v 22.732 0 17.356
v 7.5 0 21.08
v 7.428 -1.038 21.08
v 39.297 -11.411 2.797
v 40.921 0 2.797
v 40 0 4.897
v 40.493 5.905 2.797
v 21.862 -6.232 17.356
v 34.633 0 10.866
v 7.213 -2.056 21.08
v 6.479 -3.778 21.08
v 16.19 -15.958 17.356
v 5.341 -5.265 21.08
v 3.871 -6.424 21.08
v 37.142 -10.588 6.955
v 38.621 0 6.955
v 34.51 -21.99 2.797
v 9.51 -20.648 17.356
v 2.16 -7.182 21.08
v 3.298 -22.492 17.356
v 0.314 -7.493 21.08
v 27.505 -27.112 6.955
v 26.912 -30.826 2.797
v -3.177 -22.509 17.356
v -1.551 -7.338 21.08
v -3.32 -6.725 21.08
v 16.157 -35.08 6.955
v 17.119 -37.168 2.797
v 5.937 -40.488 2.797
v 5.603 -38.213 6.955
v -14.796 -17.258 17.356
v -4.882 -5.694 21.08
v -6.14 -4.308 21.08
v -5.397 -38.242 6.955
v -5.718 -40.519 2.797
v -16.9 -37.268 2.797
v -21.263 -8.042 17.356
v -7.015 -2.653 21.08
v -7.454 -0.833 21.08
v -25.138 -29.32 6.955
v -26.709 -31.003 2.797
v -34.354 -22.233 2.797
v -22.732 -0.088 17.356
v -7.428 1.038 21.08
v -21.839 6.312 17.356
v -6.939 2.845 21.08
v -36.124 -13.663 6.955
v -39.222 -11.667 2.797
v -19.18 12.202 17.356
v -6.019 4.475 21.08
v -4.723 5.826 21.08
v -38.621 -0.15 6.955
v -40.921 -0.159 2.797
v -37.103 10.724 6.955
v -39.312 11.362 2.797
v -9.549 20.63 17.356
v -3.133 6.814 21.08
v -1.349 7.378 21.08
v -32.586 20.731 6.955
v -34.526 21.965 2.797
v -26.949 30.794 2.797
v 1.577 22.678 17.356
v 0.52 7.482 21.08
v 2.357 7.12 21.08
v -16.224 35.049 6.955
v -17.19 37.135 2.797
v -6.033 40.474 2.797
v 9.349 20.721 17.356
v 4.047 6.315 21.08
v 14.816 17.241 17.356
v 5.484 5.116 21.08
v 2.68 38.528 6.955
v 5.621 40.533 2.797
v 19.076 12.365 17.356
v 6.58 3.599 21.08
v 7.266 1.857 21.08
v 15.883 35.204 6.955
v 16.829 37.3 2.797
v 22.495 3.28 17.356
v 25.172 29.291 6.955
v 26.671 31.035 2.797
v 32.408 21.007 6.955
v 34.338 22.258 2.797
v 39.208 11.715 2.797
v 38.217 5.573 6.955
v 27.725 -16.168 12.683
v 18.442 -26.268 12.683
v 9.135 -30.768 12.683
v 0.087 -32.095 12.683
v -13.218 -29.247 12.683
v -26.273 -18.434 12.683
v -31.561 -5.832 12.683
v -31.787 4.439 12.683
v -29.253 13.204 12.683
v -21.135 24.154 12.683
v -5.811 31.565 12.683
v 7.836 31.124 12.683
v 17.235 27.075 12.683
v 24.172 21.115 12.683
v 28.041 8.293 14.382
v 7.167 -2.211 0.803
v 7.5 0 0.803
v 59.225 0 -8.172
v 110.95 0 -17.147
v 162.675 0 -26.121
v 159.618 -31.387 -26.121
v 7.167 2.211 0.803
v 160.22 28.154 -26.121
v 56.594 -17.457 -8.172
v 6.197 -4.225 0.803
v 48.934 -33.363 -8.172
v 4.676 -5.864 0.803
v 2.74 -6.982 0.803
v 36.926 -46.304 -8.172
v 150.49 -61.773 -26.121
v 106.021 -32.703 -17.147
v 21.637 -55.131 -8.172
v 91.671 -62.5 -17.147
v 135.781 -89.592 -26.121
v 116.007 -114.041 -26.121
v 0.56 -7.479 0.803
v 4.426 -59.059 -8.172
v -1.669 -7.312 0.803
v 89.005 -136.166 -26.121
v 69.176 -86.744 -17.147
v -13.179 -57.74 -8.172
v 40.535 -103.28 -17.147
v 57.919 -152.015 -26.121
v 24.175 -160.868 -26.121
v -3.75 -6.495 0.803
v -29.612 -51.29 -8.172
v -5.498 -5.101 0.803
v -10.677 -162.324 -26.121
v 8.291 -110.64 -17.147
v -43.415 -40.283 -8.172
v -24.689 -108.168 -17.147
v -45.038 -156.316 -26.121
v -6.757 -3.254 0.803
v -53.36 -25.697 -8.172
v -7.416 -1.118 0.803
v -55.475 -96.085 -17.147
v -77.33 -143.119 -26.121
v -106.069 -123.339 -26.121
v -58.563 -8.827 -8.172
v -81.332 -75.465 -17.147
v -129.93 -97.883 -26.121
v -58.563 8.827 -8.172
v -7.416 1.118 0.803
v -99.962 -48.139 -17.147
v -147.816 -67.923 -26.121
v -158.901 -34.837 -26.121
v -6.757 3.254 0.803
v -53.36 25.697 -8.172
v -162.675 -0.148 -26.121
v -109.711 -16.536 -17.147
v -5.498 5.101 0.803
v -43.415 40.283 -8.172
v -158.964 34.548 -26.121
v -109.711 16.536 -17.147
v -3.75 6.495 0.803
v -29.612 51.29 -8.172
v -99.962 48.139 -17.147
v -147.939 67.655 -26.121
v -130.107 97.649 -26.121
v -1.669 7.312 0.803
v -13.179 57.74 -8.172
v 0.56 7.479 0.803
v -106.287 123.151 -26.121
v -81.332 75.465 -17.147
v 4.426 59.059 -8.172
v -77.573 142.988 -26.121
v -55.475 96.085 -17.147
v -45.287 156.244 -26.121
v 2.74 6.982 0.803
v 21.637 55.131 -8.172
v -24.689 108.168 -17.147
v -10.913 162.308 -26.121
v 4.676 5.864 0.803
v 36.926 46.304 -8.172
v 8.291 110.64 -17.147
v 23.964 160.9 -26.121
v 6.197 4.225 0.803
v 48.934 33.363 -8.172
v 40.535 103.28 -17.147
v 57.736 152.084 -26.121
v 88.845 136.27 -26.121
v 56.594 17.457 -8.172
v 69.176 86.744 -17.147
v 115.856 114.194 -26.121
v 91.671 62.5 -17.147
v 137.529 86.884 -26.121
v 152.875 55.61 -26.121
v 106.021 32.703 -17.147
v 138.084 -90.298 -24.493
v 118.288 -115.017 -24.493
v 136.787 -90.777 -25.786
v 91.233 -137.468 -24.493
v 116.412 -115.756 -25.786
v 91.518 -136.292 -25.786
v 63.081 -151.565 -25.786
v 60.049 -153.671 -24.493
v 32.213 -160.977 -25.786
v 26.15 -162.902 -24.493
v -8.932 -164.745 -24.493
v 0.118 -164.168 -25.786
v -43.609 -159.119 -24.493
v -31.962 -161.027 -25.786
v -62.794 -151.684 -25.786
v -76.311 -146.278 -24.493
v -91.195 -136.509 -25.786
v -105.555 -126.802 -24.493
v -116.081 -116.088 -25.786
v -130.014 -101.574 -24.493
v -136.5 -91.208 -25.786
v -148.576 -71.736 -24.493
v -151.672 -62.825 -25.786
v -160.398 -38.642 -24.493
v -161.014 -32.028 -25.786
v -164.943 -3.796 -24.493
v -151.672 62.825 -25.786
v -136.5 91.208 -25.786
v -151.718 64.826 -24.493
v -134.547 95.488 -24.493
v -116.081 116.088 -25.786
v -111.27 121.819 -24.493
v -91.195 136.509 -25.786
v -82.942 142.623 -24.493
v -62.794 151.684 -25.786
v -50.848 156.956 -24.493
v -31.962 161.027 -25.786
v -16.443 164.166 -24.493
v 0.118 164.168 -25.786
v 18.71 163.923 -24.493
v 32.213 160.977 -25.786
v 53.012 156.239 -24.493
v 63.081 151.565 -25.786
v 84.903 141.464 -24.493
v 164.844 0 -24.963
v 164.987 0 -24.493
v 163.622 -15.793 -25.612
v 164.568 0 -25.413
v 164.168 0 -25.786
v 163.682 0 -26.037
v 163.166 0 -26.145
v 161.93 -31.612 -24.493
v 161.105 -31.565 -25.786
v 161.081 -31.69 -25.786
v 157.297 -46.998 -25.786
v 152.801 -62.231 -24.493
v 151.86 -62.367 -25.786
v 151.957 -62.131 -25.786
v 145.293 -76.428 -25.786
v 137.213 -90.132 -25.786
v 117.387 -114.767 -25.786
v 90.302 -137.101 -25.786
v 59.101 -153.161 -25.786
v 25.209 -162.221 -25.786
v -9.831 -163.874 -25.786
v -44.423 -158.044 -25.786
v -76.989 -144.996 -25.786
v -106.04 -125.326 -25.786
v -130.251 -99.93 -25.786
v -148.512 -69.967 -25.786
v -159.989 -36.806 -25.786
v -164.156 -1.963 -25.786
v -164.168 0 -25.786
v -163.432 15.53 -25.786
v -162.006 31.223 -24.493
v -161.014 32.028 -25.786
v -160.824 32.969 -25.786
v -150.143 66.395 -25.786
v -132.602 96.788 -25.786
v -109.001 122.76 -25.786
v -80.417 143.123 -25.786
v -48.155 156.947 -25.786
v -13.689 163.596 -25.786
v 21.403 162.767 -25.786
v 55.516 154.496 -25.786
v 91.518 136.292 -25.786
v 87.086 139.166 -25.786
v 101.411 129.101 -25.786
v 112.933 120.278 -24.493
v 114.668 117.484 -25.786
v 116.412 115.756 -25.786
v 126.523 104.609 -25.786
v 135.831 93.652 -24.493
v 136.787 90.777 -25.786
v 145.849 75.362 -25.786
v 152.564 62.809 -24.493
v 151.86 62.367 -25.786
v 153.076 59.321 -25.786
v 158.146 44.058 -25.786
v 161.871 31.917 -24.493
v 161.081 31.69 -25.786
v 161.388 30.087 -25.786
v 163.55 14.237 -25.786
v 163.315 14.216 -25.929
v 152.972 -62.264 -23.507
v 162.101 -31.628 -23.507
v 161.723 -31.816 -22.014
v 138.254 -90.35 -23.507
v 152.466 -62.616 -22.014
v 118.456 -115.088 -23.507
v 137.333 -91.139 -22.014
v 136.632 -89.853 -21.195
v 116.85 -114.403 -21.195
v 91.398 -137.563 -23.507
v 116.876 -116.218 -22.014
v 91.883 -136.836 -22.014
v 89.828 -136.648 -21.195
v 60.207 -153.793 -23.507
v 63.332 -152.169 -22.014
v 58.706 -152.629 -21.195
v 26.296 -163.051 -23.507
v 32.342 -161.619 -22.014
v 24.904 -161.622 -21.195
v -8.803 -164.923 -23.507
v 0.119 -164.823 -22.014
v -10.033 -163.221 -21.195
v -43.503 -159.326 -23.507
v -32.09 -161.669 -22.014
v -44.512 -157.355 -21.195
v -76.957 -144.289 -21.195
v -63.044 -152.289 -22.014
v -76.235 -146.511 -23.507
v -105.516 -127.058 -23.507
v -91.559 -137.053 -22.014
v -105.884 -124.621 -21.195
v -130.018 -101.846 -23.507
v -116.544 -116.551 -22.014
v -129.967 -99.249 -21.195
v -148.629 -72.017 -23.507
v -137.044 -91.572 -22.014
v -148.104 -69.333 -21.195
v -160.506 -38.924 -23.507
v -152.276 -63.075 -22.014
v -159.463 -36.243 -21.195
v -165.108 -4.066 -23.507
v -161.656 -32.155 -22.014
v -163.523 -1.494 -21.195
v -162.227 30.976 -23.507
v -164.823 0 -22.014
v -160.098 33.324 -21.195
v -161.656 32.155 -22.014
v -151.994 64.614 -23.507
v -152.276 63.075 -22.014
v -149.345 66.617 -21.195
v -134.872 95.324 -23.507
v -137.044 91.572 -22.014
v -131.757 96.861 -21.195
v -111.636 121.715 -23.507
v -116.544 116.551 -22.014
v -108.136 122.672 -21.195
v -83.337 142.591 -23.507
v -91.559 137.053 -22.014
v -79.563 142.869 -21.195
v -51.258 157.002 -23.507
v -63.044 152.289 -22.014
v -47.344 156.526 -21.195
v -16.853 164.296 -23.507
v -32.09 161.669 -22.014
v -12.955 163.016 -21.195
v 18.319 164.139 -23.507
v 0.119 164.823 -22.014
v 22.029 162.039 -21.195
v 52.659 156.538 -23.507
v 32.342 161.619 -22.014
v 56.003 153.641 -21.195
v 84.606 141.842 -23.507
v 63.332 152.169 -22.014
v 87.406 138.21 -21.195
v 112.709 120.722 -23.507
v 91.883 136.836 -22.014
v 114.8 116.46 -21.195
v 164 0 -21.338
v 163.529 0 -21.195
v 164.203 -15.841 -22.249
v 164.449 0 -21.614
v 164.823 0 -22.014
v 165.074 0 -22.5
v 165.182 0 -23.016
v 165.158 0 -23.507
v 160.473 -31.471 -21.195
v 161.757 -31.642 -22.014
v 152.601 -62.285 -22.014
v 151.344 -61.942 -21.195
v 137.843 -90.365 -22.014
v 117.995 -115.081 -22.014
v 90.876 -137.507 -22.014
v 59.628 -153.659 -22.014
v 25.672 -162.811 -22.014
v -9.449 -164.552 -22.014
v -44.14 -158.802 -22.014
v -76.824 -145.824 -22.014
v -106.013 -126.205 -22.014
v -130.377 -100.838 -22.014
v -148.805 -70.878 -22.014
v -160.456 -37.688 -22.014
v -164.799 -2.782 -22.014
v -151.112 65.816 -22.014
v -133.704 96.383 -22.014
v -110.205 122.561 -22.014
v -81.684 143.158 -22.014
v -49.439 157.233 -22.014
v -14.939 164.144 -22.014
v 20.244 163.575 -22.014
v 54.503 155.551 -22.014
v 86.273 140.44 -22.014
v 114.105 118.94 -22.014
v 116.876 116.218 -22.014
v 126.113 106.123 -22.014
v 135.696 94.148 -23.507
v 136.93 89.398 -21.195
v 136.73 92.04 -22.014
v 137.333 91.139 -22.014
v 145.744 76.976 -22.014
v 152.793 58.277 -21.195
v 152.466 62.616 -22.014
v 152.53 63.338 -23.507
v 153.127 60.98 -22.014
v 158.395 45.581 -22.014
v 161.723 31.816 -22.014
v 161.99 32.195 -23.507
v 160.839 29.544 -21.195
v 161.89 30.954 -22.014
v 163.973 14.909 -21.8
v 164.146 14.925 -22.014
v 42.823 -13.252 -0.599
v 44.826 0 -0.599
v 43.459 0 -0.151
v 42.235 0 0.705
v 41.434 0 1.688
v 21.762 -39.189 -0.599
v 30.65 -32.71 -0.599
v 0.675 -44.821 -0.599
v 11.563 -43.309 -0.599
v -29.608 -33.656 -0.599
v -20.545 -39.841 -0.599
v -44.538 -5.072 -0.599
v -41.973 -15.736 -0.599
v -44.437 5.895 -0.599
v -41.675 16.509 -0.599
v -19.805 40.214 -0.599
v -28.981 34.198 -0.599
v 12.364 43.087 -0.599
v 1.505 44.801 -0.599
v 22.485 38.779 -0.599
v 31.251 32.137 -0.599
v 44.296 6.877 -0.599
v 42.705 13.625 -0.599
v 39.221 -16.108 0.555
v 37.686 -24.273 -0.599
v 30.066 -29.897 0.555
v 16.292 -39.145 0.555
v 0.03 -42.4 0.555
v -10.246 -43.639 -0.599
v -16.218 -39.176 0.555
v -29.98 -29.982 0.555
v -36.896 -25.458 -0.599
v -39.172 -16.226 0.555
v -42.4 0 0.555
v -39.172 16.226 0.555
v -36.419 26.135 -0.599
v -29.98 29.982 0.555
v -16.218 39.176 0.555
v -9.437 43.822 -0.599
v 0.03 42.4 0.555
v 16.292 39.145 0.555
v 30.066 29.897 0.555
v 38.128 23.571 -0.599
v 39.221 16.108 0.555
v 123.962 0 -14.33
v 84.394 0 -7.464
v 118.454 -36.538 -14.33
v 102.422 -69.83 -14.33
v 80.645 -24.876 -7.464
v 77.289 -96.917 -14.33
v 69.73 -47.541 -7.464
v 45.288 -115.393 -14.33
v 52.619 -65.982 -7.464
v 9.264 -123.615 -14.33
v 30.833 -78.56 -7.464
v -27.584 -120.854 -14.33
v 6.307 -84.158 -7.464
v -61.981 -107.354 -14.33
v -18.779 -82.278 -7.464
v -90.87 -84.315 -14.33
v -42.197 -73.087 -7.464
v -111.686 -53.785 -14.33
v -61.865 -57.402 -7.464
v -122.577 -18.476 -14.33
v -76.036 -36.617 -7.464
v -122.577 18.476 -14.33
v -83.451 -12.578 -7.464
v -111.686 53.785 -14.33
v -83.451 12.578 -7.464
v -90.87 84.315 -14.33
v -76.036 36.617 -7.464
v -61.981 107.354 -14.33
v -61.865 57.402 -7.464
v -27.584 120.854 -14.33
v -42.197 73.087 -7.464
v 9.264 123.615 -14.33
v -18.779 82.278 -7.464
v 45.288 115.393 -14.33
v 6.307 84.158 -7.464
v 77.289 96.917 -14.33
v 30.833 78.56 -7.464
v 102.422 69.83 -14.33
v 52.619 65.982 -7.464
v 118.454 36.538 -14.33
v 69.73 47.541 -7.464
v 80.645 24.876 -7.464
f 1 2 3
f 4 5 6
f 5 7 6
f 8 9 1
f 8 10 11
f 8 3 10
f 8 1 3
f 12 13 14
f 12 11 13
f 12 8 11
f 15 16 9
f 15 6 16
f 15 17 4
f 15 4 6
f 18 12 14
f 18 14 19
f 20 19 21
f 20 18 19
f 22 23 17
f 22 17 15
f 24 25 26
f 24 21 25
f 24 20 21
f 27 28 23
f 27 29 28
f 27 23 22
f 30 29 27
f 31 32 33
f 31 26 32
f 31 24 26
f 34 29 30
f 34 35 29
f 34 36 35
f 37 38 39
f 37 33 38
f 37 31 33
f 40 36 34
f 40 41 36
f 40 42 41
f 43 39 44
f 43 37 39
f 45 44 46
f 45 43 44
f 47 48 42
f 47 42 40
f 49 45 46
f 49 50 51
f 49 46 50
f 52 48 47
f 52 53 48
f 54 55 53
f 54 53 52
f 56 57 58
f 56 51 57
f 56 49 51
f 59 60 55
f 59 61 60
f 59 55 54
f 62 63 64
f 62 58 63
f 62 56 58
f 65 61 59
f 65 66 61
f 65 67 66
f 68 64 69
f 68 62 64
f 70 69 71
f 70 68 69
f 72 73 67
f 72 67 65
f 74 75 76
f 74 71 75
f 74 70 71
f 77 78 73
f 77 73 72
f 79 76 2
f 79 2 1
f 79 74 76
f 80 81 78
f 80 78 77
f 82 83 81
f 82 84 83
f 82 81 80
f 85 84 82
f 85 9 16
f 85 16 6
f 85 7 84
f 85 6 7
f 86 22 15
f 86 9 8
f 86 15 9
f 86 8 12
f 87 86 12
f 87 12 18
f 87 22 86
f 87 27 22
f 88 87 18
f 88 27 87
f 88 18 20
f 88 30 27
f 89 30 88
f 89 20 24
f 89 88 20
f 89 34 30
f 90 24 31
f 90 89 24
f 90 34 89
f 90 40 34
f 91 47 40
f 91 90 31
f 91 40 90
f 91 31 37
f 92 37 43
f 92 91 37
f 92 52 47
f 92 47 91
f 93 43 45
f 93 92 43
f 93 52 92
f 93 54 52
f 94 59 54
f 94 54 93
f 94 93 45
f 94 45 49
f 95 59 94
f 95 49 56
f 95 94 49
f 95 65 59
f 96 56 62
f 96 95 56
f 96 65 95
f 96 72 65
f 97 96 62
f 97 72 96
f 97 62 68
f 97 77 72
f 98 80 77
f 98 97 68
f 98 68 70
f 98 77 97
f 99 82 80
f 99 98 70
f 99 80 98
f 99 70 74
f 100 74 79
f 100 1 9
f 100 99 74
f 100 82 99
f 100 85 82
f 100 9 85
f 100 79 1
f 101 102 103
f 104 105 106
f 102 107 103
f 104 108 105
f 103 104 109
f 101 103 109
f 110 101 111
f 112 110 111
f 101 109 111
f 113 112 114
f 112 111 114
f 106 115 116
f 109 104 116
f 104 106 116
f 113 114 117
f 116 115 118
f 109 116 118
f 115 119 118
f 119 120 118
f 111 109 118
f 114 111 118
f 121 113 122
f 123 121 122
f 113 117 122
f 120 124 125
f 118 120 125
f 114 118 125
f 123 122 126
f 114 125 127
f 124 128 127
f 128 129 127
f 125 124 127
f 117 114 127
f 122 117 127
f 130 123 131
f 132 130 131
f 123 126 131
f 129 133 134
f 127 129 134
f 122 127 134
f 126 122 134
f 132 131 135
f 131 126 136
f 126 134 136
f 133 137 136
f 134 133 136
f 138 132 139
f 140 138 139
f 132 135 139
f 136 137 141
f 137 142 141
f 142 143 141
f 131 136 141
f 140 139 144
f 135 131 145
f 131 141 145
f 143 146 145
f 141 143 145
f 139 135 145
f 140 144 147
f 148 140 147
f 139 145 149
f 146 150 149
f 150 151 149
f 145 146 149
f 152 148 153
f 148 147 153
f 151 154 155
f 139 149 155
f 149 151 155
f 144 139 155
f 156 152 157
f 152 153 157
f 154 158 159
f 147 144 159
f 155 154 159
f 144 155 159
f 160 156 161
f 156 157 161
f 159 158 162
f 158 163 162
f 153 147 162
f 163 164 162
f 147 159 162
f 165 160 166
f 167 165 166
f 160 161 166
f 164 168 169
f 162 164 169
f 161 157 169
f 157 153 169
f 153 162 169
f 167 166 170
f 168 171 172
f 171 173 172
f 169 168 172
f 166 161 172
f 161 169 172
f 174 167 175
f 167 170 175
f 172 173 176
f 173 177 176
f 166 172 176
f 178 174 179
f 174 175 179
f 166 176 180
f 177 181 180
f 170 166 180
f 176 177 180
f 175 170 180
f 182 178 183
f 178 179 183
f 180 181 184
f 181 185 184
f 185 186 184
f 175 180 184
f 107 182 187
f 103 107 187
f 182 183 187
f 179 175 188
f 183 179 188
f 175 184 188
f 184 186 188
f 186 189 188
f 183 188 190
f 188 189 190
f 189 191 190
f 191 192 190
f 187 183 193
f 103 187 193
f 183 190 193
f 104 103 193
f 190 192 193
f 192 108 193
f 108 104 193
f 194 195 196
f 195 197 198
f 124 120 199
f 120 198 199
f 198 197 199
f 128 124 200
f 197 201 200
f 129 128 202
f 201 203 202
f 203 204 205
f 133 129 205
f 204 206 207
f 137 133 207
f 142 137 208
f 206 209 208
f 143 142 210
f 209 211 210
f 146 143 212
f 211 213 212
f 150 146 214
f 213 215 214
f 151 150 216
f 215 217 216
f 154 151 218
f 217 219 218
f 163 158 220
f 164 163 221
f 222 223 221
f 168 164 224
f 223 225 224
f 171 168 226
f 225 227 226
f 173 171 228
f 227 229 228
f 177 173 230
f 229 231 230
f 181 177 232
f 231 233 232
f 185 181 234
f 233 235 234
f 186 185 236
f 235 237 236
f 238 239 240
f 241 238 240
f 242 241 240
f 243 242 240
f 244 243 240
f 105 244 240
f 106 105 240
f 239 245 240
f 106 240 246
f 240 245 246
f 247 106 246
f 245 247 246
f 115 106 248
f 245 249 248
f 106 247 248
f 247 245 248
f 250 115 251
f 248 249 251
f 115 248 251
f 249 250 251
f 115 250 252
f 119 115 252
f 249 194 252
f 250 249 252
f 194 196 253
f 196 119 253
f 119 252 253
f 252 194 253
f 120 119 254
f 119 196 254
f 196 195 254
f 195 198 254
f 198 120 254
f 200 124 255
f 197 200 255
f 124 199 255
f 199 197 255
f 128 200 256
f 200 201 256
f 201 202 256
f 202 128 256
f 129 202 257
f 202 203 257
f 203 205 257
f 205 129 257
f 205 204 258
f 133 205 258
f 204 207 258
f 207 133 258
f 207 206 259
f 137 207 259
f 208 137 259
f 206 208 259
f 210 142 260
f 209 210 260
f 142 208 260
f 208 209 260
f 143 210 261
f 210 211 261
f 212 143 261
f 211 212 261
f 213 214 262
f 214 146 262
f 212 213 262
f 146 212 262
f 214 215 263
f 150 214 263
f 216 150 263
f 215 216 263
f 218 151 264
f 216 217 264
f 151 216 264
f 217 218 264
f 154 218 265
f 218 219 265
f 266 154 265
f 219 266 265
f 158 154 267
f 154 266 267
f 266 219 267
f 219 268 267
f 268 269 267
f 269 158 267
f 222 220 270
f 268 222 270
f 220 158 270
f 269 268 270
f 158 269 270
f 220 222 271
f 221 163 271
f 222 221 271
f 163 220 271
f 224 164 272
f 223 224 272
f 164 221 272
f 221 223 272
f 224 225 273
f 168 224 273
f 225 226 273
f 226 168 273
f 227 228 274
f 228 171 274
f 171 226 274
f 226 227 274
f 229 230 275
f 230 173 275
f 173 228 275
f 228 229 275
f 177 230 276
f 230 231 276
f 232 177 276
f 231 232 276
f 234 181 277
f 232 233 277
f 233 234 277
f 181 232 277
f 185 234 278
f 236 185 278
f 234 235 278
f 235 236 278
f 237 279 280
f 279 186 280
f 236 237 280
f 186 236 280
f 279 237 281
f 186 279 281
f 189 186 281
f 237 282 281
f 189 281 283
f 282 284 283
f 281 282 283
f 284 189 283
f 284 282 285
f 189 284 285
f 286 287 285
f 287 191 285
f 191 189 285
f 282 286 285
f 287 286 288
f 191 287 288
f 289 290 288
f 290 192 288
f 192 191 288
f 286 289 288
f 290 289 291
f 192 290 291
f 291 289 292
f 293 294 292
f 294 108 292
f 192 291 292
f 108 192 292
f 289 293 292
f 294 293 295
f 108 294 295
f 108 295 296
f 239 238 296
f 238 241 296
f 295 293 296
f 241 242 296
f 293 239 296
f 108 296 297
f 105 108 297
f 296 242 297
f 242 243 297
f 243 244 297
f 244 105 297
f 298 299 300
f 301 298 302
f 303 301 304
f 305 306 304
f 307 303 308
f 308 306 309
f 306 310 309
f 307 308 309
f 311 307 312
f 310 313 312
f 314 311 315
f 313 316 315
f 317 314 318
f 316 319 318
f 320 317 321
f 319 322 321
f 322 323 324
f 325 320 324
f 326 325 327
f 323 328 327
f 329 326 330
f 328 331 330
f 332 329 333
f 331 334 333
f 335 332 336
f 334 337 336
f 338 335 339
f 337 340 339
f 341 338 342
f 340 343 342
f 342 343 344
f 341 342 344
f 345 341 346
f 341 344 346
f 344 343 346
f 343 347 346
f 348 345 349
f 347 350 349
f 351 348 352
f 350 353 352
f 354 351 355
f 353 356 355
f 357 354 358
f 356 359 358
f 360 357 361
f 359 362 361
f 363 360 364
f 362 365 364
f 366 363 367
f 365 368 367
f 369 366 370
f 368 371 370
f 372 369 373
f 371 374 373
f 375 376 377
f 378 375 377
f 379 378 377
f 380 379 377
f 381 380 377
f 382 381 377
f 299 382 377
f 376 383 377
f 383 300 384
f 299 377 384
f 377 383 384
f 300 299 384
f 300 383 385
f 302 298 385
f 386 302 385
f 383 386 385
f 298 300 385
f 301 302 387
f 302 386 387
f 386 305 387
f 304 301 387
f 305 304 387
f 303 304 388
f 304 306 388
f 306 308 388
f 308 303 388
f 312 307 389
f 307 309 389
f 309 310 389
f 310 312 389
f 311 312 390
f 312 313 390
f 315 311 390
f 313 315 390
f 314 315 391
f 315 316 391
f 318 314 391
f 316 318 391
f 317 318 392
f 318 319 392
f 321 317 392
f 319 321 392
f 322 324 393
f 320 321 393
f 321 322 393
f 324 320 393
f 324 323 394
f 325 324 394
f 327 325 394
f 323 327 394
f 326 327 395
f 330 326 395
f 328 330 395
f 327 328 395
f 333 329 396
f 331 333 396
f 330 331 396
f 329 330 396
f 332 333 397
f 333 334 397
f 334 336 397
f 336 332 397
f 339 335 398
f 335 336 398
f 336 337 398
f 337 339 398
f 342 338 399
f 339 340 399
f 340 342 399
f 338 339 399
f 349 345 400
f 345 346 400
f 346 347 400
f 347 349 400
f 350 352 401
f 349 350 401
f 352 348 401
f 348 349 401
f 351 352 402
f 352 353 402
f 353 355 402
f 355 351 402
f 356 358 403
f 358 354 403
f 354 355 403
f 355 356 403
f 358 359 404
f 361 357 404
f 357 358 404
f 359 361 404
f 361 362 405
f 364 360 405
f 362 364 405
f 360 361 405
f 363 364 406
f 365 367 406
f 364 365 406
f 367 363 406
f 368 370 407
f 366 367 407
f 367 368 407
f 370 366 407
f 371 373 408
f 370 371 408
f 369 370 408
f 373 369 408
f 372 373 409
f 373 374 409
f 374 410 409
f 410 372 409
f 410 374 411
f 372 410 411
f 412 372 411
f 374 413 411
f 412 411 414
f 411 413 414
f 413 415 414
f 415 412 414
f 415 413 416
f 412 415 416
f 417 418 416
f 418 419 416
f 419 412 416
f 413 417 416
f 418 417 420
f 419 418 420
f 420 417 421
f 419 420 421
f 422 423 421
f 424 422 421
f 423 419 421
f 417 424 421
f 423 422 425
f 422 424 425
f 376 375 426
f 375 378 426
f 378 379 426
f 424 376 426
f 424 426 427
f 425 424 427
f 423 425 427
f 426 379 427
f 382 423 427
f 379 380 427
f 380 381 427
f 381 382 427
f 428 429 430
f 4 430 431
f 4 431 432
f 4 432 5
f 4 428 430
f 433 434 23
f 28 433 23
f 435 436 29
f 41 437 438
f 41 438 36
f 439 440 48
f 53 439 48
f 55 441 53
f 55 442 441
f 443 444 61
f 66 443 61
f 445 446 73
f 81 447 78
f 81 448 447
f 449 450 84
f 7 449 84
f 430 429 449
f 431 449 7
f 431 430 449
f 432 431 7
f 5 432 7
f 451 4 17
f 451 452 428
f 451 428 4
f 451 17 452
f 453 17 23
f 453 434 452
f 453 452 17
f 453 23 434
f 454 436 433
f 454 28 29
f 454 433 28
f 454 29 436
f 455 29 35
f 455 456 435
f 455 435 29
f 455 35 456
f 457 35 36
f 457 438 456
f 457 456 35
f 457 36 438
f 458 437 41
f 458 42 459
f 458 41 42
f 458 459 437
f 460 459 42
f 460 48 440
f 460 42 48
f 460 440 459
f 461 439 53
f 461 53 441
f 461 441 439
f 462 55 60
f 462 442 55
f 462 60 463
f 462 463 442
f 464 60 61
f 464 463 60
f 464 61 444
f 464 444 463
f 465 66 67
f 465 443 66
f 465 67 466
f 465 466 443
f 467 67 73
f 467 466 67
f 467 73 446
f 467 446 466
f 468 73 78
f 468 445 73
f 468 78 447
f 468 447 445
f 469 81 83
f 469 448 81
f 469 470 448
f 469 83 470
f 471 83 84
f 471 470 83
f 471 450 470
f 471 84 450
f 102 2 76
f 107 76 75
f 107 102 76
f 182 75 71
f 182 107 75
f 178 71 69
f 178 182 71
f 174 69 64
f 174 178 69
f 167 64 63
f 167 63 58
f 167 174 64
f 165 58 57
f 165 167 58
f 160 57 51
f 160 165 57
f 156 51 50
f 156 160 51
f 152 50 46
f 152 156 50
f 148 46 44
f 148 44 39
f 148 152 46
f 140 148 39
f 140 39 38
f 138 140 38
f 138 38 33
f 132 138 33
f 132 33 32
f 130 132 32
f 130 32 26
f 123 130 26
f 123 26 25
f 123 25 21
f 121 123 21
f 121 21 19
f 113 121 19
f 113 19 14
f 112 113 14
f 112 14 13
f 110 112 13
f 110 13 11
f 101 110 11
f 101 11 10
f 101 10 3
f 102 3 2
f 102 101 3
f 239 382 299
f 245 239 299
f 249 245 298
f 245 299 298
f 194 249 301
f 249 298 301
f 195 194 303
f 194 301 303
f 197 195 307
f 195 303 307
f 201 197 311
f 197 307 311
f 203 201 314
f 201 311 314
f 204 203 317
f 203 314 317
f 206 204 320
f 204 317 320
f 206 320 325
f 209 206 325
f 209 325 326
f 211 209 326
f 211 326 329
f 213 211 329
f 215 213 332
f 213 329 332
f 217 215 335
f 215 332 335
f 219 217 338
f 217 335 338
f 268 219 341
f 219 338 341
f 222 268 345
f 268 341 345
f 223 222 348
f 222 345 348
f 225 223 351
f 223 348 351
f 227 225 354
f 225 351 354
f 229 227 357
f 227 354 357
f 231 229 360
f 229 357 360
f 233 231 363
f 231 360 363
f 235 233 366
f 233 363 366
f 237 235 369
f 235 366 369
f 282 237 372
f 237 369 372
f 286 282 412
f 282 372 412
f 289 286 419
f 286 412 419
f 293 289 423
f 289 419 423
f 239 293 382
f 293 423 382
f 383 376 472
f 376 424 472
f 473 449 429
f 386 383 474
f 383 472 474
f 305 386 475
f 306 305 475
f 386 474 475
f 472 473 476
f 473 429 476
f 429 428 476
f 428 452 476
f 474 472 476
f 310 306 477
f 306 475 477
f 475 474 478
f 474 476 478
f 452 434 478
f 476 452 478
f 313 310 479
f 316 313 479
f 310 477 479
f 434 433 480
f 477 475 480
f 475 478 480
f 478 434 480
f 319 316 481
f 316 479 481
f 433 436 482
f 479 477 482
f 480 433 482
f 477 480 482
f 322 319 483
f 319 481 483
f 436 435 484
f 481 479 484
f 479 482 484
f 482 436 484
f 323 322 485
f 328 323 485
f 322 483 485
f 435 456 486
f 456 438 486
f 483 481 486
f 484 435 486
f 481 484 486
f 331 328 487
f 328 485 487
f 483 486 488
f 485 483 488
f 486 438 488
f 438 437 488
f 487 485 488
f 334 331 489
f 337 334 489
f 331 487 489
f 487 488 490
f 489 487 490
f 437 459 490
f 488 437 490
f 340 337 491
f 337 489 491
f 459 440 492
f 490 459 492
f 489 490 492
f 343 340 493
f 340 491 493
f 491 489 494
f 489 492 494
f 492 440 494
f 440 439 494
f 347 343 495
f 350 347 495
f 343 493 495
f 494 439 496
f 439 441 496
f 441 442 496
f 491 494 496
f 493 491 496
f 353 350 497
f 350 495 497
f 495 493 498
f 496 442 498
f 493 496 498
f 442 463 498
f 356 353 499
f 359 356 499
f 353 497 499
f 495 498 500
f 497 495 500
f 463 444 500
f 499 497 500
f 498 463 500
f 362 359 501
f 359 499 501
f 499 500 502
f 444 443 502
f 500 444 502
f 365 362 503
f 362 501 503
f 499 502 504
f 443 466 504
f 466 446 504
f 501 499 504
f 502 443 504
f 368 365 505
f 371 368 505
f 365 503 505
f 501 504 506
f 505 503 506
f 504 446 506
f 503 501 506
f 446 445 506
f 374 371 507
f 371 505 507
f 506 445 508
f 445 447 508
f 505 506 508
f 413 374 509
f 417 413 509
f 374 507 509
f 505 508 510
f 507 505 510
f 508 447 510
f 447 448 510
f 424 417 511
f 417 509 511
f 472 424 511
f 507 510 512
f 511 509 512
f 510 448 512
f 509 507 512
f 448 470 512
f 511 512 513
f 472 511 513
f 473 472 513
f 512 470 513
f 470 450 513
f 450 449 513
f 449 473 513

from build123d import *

# Parameters (mm, degrees)
F2_R          = 7.5
F3_DEPTH      = 21.537803
F3_DEPTH_BACK = 26.464197
F4_R          = 2
F5_R          = 5


with BuildPart() as f1:
    # F0 (on Front) → F1 (revolve)
    with BuildSketch(Plane.XZ):
        with BuildLine():
            Line((165.5, -21.536803), (41.375, 0))
            add(Edge.make_bspline(
                [(0, 21.536803), (20.6875, 21.536803), (41.375, 10.768401), (41.375, 0)],
                knots=[0, 0, 0, 0, 46.644662, 46.644662, 46.644662, 46.644662], degree=3))
            Line((0, 21.536803), (0, 2.104229))
            Line((0, 2.104229), (164.645226, -26.463197))
            Line((164.645226, -26.463197), (165.5, -21.536803))
        make_face()
    revolve(axis=Axis((0, 0, -2.463197), (0, 0, -1)))

    # F2 (on Top) → F3 (cut, two sides)
    with BuildSketch(Plane.XY) as f3_sk:
        Circle(F2_R)
    extrude(amount=F3_DEPTH, mode=Mode.SUBTRACT)
    extrude(f3_sk.sketch, amount=-F3_DEPTH_BACK, mode=Mode.SUBTRACT)

    # F4
    f4_edges = [f1.edges().sort_by_distance(p)[0] for p in [
        (-164.645226, 0, -26.463197),
        (-165.5, 0, -21.536803),
    ]]
    fillet(f4_edges, radius=F4_R)

    # F5
    f5_edges = [f1.edges().sort_by_distance(p)[0] for p in [
        (-41.375, 0, 0),
    ]]
    fillet(f5_edges, radius=F5_R)


solid = f1.part
